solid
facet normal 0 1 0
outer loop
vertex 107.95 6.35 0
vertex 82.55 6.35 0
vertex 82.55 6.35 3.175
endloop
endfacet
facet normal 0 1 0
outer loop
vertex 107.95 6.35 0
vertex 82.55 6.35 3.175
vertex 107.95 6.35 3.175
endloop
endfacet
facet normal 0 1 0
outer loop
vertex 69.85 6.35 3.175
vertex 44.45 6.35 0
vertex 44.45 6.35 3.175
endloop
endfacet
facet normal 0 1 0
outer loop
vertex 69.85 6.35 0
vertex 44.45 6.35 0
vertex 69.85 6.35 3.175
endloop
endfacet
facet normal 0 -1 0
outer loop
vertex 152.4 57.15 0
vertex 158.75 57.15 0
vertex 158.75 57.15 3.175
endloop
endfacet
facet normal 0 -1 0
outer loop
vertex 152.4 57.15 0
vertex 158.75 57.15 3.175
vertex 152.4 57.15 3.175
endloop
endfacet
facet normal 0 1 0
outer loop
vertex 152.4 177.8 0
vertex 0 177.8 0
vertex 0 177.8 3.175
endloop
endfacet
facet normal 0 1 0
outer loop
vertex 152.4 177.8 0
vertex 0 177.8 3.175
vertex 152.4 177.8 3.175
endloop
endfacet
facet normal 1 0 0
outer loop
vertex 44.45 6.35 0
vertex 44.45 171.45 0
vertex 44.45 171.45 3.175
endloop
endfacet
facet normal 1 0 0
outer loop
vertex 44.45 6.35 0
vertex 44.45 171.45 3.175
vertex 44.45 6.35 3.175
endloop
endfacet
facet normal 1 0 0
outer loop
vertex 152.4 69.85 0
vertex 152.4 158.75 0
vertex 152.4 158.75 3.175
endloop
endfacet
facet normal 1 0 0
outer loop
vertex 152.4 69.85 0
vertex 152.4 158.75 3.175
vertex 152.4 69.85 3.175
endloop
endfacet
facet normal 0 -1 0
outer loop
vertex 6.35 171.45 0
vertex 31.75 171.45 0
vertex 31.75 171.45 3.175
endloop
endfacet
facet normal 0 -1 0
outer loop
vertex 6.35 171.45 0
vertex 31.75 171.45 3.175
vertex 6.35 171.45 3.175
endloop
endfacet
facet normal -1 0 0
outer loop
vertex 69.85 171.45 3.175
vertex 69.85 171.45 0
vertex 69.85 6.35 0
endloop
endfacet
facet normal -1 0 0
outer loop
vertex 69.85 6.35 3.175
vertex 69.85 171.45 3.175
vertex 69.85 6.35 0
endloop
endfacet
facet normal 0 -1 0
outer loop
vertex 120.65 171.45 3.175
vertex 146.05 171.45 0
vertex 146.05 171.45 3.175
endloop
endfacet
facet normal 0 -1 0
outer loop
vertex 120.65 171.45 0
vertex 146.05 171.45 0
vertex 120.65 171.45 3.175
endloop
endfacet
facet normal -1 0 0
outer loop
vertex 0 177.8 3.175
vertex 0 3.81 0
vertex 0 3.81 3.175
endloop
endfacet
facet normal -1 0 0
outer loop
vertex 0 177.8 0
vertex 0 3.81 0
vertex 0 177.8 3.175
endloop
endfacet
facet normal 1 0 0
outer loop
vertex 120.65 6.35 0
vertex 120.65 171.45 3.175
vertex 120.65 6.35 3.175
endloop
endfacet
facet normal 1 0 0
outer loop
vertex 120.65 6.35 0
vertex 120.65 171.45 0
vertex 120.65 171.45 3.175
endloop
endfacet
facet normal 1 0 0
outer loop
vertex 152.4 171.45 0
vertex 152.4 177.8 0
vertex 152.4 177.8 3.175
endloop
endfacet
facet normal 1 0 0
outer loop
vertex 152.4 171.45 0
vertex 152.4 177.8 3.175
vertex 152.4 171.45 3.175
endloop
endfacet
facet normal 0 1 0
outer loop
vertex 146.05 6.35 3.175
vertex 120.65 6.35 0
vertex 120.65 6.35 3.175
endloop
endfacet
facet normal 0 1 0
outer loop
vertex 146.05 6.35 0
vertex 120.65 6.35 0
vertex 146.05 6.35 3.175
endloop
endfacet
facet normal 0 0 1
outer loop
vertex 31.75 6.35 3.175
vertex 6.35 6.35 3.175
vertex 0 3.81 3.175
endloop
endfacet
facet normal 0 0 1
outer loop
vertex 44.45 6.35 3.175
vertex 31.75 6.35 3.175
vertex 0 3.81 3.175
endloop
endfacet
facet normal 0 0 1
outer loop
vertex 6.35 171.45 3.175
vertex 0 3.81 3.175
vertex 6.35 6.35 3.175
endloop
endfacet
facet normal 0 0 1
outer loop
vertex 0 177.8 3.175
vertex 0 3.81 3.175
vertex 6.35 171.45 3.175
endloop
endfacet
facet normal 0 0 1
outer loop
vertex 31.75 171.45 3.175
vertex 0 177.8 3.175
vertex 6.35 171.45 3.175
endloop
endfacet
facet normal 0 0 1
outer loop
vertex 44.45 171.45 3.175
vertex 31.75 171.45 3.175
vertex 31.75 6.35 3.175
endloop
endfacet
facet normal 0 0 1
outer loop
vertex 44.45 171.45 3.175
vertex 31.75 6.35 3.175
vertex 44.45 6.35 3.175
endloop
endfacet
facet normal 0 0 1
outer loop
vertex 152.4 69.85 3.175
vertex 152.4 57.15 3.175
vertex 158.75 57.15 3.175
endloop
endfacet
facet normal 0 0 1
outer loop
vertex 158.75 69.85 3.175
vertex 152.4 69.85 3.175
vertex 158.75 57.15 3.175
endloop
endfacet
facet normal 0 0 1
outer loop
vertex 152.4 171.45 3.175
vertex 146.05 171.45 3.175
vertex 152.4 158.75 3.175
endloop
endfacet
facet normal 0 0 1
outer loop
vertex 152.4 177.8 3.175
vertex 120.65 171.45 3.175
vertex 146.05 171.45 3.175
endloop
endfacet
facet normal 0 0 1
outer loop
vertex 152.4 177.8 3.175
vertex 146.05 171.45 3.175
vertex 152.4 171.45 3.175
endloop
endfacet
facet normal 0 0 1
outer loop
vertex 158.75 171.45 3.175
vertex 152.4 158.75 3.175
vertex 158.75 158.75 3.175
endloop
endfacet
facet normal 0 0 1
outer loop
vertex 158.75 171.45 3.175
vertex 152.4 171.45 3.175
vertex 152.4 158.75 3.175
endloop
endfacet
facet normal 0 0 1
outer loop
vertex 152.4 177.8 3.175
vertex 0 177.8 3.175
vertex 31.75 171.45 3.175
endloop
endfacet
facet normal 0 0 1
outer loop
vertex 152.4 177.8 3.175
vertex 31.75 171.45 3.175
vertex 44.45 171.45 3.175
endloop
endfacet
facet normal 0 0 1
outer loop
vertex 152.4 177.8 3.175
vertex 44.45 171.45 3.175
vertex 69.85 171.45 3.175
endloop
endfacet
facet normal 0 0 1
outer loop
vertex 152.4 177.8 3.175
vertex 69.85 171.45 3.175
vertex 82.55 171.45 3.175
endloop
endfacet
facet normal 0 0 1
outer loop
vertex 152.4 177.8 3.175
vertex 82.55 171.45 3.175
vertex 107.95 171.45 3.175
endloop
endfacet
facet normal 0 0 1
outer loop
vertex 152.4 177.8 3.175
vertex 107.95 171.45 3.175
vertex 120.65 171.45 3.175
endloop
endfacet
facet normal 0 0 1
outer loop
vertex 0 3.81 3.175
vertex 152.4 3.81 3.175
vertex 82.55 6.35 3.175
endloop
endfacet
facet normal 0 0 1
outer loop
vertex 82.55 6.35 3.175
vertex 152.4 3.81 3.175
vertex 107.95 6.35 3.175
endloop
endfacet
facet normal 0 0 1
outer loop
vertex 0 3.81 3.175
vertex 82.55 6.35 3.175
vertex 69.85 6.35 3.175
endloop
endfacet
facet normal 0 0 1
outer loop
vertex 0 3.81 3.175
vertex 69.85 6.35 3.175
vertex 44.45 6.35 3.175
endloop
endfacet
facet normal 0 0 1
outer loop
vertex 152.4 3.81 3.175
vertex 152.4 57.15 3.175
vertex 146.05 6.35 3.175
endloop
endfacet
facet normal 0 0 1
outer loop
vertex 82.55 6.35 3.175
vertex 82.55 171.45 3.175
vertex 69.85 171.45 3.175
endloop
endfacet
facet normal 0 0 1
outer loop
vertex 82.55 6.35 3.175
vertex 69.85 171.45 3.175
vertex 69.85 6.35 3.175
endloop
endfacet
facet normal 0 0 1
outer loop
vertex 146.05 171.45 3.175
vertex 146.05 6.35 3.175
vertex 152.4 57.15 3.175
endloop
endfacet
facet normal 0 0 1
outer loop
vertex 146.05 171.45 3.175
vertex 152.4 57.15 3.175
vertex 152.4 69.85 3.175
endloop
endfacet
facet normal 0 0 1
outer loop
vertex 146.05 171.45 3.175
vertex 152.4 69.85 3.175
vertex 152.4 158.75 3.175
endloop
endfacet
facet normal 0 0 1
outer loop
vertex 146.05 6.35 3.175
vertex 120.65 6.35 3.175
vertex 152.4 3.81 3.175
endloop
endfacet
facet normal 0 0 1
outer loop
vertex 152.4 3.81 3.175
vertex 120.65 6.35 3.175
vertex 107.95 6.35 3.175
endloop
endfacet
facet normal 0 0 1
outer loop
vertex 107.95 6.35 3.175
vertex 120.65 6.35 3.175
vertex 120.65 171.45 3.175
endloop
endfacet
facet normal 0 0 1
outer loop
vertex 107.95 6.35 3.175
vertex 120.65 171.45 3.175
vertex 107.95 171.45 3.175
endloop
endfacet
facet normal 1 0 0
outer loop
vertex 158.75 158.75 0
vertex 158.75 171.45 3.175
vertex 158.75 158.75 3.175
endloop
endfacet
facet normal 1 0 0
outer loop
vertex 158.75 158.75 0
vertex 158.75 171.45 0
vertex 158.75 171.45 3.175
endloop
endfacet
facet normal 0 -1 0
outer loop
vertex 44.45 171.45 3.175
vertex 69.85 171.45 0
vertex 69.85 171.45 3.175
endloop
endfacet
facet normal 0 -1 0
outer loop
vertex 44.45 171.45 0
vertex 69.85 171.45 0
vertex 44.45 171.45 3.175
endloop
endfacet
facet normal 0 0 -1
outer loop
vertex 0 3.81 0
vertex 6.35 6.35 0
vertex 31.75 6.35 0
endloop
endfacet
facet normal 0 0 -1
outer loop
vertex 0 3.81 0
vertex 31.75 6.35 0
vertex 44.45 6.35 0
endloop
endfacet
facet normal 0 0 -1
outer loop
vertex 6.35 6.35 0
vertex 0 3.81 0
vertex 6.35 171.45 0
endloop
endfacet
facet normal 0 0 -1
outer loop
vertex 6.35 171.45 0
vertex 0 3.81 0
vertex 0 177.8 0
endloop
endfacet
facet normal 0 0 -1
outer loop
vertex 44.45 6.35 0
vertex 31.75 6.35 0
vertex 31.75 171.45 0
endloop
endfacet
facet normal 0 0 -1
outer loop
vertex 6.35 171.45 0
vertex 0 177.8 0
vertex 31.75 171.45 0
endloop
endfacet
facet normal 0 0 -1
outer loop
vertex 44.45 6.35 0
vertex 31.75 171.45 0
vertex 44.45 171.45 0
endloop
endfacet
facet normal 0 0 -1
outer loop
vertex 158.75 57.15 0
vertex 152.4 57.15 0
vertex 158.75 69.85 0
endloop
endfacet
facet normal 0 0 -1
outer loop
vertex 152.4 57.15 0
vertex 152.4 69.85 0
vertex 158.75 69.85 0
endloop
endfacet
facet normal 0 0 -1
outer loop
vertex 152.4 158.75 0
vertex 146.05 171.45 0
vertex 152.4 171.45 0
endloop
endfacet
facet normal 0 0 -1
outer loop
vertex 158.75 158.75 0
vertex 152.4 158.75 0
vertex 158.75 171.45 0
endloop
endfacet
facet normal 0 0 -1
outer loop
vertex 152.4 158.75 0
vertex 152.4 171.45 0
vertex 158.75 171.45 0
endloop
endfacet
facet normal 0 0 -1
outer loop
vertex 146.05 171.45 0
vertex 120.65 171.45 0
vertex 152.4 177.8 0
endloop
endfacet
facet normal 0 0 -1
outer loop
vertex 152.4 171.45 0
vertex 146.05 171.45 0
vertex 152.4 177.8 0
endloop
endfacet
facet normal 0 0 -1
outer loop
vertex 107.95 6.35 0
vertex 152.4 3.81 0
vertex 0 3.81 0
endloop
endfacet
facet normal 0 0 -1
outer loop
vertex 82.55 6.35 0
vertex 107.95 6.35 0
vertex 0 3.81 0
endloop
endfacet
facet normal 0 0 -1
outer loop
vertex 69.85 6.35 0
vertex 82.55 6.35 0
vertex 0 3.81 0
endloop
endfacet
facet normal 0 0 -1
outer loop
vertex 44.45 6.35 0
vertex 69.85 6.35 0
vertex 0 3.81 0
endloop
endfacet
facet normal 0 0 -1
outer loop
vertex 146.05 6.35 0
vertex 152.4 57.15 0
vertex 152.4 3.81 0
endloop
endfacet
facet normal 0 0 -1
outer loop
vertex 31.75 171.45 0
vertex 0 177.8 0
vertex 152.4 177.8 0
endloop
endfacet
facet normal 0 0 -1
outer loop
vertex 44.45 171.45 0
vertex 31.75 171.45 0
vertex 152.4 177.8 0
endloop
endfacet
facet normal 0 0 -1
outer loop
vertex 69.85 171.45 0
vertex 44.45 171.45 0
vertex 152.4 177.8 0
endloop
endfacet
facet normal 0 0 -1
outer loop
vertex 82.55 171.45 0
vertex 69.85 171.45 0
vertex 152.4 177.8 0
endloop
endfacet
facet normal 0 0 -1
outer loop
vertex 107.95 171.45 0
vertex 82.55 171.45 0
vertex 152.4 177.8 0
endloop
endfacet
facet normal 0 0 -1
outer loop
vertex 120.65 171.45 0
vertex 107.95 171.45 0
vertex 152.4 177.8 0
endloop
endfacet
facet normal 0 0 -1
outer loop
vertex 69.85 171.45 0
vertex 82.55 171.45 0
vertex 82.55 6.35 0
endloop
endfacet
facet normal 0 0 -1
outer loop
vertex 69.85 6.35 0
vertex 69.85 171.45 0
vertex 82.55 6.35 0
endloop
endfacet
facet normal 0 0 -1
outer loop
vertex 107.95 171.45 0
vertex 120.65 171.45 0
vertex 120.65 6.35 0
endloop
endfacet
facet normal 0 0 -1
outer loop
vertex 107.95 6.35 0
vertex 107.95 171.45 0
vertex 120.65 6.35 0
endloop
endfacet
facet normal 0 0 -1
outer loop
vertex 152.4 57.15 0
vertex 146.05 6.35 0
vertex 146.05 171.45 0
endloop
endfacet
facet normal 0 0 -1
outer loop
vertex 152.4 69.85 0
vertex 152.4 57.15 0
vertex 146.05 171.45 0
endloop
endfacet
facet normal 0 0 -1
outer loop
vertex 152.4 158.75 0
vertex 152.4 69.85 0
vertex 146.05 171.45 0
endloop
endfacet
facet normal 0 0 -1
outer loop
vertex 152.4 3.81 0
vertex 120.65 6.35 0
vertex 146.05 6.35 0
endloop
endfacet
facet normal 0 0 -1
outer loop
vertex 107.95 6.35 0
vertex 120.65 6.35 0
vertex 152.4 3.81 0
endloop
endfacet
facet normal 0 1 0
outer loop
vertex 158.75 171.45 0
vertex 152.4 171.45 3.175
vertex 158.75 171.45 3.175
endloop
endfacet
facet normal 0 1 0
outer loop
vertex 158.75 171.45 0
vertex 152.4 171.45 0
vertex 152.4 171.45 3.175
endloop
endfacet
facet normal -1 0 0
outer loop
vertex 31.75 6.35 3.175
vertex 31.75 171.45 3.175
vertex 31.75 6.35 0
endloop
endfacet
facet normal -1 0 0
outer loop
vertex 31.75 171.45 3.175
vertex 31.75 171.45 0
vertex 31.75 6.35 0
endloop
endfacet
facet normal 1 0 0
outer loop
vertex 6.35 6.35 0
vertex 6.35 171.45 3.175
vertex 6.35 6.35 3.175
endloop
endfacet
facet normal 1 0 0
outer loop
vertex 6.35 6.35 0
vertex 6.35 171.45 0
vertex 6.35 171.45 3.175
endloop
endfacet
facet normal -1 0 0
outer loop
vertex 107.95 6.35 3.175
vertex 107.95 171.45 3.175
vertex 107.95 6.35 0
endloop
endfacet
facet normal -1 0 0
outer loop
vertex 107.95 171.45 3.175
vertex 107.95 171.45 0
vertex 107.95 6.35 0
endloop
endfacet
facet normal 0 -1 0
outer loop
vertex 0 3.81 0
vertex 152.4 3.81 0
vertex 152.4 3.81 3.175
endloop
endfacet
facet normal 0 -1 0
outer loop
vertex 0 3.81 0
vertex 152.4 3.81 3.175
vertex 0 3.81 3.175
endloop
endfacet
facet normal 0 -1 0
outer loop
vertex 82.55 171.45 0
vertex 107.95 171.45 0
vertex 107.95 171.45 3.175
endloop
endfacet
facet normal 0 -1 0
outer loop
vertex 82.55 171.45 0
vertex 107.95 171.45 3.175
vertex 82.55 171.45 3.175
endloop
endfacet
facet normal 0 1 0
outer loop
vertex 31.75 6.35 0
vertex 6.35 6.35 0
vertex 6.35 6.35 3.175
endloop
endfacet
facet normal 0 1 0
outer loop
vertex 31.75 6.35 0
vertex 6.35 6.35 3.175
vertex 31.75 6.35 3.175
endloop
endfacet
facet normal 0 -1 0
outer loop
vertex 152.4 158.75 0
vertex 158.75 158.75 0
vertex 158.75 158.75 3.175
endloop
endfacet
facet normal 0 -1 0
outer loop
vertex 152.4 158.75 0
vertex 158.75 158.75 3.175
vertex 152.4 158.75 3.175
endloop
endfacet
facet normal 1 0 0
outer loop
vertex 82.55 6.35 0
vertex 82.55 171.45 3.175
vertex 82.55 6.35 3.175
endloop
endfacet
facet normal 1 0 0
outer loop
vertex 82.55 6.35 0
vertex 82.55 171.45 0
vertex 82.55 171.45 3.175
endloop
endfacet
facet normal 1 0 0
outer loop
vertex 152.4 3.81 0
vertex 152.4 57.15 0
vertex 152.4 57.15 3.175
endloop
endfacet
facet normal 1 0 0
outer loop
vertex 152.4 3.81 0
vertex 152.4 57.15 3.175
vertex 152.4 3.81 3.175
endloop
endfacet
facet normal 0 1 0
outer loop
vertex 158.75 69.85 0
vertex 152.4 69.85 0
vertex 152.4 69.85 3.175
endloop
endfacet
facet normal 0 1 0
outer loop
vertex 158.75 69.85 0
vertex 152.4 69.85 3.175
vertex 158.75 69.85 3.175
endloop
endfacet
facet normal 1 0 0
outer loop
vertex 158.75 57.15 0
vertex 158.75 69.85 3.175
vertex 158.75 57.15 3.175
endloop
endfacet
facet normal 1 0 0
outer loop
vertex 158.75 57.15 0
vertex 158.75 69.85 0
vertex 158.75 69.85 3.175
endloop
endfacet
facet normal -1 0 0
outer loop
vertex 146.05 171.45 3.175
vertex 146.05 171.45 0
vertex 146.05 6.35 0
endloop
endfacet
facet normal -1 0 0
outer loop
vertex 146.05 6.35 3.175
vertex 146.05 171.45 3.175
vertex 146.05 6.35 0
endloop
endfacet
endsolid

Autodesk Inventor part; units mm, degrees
ref_plane "YZ Plane" through (0, 0, 0) normal (1, 0, 0) x (0, 1, 0)
ref_plane "XZ Plane" through (0, 0, 0) normal (0, 1, 0) x (-1, 0, 0)
ref_plane "XY Plane" through (0, 0, 0) normal (0, 0, 1) x (1, 0, 0)
sketch "Sketch1" plane through (0, 0, 0) normal (0, 0, 1) x (1, 0, 0)
  line L0 (0, 0) -> (0, 177.8)
  line L1 (0, 177.8) -> (152.4, 177.8)
  line L2 (152.4, 177.8) -> (152.4, 0)
  line L3 (152.4, 0) -> (0, 0)
  dimension "d0" = 177.8
  dimension "d1" = 152.4
extrude "Extrusion1" add sketch "Sketch1" along normal blind 3.175
sketch "Sketch2" plane through (0, 0, 0) normal (0, 0, -1) x (-1, 0, 0)
  line L0 (-152.4, 177.8) -> (0, 177.8) projected
  line L1 (-152.4, 0) -> (-152.4, 177.8) projected
  line L2 (0, 0) -> (-152.4, 0) projected
  line L3 (-152.4, 171.45) -> (-158.75, 171.45)
  line L4 (-158.75, 171.45) -> (-158.75, 158.75)
  line L5 (-158.75, 158.75) -> (-152.4, 158.75)
  line L6 (-152.4, 69.85) -> (-158.75, 69.85)
  line L7 (-158.75, 69.85) -> (-158.75, 57.15)
  line L8 (-158.75, 57.15) -> (-152.4, 57.15)
  dimension "d9" = 6.35
  dimension "d10" = 12.7
  dimension "d11" = 6.35
  dimension "d12" = 12.7
  dimension "d13" = 88.9
  dimension "d14" = 6.35
extrude "Extrusion2" add sketch "Sketch2" against normal blind 3.175
sketch "Sketch3" plane through (0, 0, 0) normal (0, 0, -1) x (-1, 0, 0)
  line L0 (-152.4, 177.8) -> (0, 177.8) projected
  line L1 (-152.4, 171.45) -> (-152.4, 177.8) projected
  line L2 (0, 0) -> (-152.4, 0) projected
  line L3 (-146.05, 171.45) -> (-120.65, 171.45)
  line L4 (-120.65, 171.45) -> (-120.65, 6.35)
  line L5 (-120.65, 6.35) -> (-146.05, 6.35)
  line L6 (-146.05, 171.45) -> (-146.05, 6.35)
  line L7 (-107.95, 171.45) -> (-82.55, 171.45)
  line L8 (-82.55, 171.45) -> (-82.55, 6.35)
  line L9 (-82.55, 6.35) -> (-107.95, 6.35)
  line L10 (-107.95, 171.45) -> (-107.95, 6.35)
  line L11 (-69.85, 171.45) -> (-44.45, 171.45)
  line L12 (-44.45, 171.45) -> (-44.45, 6.35)
  line L13 (-44.45, 6.35) -> (-69.85, 6.35)
  line L14 (-69.85, 171.45) -> (-69.85, 6.35)
  line L15 (-31.75, 171.45) -> (-6.35, 171.45)
  line L16 (-6.35, 171.45) -> (-6.35, 6.35)
  line L17 (-6.35, 6.35) -> (-31.75, 6.35)
  line L18 (-31.75, 171.45) -> (-31.75, 6.35)
  dimension "d17" = 25.4
  dimension "d18" = 25.4
  dimension "d20" = 6.35
  dimension "d21" = 6.35
  dimension "d22" = 6.35
  dimension "d25" = 38.1
extrude "Extrusion3" cut sketch "Sketch3" against normal blind 3.175
sketch "Sketch4" plane through (0, 0, 0) normal (0, 0, -1) x (-1, 0, 0)
  line L0 (0, 177.8) -> (0, 0) projected
  line L1 (-152.4, 0) -> (-152.4, 57.15) projected
  line L2 (0, 0) -> (-152.4, 0) projected
  line L3 (-152.4, 3.81) -> (0, 3.81)
  dimension "d32" = 3.81
extrude "Extrusion4" cut sketch "Sketch4" against normal blind 25.4
properties part number "Backboard" material "Polycarbonate, Clear"
